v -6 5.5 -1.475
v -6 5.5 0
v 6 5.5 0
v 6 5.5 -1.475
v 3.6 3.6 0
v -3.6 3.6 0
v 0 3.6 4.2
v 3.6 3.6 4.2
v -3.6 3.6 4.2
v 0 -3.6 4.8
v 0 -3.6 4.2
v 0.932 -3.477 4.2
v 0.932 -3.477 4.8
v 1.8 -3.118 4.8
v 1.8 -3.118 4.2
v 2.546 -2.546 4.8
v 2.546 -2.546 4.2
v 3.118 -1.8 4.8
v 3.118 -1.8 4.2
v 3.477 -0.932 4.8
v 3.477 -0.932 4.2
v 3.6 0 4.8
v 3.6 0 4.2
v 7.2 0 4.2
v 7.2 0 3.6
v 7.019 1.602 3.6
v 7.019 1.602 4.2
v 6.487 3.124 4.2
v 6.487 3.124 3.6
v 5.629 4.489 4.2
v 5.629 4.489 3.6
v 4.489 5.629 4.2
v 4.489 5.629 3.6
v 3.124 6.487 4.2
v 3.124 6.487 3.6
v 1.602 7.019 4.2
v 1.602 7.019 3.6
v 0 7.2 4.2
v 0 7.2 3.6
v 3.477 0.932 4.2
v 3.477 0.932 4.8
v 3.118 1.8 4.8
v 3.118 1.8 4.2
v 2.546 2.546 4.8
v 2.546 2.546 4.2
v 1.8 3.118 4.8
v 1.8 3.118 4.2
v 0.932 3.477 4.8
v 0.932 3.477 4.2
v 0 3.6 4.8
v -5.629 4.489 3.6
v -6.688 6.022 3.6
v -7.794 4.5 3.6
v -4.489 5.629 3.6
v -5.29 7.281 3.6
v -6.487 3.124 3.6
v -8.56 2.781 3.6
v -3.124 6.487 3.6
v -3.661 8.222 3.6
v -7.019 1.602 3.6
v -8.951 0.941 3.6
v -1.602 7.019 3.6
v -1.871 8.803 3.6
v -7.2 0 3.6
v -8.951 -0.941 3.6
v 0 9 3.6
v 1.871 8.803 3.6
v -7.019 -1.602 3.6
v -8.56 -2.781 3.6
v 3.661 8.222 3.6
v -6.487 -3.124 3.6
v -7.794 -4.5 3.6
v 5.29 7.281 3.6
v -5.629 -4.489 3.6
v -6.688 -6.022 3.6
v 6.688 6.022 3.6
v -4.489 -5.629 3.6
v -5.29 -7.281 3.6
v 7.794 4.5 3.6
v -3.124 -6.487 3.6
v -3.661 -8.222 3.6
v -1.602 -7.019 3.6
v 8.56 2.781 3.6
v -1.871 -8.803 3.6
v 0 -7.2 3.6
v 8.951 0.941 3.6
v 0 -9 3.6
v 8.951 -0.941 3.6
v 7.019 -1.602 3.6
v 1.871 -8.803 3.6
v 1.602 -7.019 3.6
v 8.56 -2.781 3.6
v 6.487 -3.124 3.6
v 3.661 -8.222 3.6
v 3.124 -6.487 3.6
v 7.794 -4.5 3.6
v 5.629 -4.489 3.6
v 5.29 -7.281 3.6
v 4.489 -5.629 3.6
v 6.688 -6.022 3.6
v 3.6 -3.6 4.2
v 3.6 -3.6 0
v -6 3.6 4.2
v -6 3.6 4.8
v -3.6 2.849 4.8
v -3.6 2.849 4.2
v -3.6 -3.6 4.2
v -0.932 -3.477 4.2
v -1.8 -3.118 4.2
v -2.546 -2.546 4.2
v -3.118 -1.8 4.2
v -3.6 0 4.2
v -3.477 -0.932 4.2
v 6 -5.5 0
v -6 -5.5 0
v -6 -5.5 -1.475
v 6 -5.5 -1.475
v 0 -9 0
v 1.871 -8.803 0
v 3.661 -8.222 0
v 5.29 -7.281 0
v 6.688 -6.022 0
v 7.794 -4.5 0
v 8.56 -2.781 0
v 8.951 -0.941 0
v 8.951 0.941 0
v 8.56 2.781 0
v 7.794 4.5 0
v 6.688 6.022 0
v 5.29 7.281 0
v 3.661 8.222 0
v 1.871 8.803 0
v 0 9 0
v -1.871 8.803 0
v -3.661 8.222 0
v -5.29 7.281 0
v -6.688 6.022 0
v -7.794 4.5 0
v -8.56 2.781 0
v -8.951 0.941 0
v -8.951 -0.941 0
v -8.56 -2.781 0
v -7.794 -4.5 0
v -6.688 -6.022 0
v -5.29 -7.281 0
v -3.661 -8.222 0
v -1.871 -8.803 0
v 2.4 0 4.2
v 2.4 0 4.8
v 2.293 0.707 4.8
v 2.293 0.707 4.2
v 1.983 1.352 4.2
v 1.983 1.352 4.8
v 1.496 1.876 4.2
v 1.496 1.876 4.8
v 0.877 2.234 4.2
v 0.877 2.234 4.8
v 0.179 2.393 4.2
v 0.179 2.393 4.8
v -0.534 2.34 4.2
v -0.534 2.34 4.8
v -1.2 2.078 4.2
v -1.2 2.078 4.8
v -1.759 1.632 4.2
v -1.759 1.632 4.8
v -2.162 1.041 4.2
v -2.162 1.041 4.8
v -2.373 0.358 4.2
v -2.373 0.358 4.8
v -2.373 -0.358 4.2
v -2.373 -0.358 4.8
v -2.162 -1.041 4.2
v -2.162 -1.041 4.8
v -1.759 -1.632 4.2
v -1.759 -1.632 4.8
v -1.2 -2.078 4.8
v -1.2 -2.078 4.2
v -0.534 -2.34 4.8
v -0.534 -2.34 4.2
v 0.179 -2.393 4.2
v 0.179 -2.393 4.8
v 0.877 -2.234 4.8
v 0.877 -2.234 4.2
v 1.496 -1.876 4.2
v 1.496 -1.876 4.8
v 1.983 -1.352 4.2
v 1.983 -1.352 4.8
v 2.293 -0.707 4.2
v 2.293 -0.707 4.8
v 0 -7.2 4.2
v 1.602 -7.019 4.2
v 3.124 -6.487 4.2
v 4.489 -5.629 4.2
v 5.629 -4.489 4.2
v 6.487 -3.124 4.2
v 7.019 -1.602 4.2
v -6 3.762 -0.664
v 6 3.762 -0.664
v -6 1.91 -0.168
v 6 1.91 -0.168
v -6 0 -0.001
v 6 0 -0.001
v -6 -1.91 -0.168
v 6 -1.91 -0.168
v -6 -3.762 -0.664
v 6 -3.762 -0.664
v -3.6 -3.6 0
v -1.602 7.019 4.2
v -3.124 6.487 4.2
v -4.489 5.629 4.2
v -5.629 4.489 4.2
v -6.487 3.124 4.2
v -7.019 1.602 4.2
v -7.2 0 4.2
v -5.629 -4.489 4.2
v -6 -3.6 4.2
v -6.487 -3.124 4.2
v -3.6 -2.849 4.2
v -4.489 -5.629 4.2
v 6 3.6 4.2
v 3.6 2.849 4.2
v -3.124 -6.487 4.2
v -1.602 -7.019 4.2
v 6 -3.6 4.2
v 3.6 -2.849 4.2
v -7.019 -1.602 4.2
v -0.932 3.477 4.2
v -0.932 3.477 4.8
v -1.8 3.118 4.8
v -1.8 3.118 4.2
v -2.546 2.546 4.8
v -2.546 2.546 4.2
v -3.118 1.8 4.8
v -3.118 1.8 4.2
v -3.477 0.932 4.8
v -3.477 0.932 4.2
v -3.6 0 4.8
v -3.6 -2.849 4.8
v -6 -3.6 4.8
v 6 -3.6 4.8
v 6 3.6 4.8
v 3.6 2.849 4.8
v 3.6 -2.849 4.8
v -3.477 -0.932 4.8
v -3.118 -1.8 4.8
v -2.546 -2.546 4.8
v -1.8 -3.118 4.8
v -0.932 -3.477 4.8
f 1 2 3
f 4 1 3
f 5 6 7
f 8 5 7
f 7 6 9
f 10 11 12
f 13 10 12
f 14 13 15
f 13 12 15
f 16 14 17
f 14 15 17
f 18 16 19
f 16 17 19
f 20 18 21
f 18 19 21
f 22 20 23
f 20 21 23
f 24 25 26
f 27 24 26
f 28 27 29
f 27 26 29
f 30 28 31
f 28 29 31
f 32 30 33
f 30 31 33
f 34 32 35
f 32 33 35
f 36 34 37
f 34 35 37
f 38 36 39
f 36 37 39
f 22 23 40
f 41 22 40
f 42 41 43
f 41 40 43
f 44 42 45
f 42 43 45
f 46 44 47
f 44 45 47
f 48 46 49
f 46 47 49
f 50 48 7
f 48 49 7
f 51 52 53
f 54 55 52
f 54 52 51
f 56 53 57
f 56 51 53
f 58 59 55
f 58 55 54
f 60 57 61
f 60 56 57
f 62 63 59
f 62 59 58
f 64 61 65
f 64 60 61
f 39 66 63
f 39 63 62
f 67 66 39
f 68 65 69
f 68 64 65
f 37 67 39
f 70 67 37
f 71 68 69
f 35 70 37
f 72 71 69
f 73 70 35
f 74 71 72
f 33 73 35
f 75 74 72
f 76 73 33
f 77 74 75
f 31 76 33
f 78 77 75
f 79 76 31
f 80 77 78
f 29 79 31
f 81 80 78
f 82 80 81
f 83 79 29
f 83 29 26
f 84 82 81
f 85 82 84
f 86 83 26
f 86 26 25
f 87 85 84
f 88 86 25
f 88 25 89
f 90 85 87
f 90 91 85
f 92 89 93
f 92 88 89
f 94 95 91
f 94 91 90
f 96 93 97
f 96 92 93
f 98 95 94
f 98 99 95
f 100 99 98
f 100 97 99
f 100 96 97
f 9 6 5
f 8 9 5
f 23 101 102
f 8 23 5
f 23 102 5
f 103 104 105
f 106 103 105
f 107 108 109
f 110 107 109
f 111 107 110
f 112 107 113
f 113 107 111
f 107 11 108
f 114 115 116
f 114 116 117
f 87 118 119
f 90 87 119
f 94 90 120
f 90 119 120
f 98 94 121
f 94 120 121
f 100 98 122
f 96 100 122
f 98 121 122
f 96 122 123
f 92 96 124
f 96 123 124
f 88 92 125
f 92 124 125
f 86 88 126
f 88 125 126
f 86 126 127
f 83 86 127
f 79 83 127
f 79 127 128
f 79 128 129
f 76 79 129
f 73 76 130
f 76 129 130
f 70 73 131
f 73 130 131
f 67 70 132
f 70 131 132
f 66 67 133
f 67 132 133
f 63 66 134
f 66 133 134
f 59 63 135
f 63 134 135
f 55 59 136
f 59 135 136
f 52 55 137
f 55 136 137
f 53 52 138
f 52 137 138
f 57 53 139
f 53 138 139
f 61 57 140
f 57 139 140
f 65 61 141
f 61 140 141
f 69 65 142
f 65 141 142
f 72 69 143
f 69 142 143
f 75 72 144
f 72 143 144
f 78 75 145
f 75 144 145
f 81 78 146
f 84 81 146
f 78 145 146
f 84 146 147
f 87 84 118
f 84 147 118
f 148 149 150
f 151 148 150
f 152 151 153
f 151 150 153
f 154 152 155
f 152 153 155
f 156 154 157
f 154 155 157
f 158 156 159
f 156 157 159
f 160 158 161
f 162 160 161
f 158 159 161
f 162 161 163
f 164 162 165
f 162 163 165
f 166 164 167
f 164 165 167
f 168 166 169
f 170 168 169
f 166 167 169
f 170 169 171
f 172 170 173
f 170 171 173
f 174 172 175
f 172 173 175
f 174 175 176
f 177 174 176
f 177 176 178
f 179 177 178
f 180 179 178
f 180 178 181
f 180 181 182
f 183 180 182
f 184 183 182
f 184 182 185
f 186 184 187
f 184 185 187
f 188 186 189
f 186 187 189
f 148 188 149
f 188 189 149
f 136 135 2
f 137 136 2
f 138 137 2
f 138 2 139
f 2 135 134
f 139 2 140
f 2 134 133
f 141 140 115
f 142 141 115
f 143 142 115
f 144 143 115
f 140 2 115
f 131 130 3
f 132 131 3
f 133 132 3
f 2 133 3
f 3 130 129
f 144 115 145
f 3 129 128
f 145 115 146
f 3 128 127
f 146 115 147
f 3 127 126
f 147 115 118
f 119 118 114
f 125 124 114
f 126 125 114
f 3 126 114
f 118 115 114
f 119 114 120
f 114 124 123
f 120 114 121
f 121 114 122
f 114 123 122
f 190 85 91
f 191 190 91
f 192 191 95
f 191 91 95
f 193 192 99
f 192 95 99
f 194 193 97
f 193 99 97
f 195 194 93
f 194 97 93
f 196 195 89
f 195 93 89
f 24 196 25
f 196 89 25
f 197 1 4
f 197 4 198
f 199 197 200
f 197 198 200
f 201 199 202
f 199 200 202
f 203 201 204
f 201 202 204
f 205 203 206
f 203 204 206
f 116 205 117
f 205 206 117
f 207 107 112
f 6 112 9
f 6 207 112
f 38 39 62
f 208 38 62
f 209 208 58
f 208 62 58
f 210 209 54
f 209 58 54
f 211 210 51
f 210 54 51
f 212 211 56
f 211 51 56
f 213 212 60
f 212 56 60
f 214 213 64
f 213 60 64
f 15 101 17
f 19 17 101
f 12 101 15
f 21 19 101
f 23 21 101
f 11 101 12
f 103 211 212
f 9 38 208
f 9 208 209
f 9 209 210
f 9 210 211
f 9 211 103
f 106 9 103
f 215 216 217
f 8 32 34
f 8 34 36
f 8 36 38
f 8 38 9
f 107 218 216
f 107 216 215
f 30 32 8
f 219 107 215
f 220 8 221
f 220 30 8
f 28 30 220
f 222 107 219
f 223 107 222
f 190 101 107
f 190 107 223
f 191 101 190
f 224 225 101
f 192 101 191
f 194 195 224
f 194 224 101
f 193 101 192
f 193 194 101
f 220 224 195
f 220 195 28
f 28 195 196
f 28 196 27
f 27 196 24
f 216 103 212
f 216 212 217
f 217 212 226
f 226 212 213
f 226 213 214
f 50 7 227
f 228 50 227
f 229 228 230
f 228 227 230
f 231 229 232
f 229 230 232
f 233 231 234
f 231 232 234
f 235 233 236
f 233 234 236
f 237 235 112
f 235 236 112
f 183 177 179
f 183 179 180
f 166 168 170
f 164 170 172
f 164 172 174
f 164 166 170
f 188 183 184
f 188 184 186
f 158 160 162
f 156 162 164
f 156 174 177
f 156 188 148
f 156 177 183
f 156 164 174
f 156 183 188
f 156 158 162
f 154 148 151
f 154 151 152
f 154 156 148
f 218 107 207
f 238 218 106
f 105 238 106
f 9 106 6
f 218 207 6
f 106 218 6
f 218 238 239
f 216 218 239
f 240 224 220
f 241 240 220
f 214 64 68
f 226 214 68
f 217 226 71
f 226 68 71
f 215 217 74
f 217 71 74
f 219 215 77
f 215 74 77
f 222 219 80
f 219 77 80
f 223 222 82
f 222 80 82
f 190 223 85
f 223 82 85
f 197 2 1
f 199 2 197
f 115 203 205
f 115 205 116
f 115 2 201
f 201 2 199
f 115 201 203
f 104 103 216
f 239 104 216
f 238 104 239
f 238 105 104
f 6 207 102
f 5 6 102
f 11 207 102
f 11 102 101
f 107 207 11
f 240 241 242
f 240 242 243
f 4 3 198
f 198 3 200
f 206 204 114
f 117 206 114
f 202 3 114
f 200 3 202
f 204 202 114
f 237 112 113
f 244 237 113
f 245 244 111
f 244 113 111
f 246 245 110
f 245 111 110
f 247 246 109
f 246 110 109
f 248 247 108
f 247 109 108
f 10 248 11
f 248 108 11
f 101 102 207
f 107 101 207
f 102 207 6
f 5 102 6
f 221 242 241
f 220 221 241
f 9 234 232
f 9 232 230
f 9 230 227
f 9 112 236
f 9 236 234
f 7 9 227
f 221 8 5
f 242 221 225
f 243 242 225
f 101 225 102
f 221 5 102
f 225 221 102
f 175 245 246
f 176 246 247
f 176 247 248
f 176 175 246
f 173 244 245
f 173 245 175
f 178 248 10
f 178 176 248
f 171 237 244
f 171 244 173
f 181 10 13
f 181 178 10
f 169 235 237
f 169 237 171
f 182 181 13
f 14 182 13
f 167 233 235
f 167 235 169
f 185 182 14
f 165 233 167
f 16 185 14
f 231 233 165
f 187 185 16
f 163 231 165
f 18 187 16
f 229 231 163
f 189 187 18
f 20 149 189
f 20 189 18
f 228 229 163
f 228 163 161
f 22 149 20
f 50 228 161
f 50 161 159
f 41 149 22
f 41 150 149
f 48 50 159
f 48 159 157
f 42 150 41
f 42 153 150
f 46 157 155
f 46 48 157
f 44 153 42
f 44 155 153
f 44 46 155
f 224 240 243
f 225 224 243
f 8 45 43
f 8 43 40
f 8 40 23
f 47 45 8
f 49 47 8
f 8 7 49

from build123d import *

# Parameters (mm, degrees)
F1_DEPTH  = 3
F2_DEPTH  = 3.5
F3_DEPTH  = 4
F0_W      = 3
F0_H      = 2
F7_DEPTH  = 6
F8_R      = 2
F9_DEPTH  = 0.5
F11_DEPTH = 3.5
F13_SCALE = 1.2
F14_ANGLE = 90
F15_W     = 12
F15_H     = 11
F16_DEPTH = 11
F17_R     = 11
F18_DEPTH = 12
F20_DEPTH = 0.6


# Not quite as in the source:
# - a feature of the source that left no trace in its solid (it failed there, or was rolled back) is left out


with BuildPart() as f1:
    # F0 (on Top) → F1 (new body)
    with BuildSketch(Plane.XY):
        with BuildLine():
            ThreePointArc((0, -7.5), (5.3033008589, -5.3033008589), (7.5, 0))
            Line((7.5, 0), (6, 0))
            ThreePointArc((6, 0), (4.2426406871, -4.2426406871), (0, -6))
            Line((0, -6), (0, -7.5))
        make_face()
        with BuildLine():
            ThreePointArc((-7.5, 0), (-5.3033008589, -5.3033008589), (0, -7.5))
            Line((0, -7.5), (0, -6))
            ThreePointArc((0, -6), (-4.2426406871, -4.2426406871), (-6, 0))
            Line((-6, 0), (-7.5, 0))
        make_face()
        with BuildLine():
            Line((0, 6), (0, 7.5))
            ThreePointArc((0, 7.5), (-5.3033008589, 5.3033008589), (-7.5, 0))
            Line((-7.5, 0), (-6, 0))
            ThreePointArc((-6, 0), (-4.2426406871, 4.2426406871), (0, 6))
        make_face()
        with BuildLine():
            Line((6, 0), (7.5, 0))
            ThreePointArc((7.5, 0), (5.3033008589, 5.3033008589), (0, 7.5))
            Line((0, 7.5), (0, 6))
            ThreePointArc((0, 6), (4.2426406871, 4.2426406871), (6, 0))
        make_face()
    extrude(amount=F1_DEPTH)

    # F0 (on Top) → F2 (join)
    with BuildSketch(Plane.XY):
        with BuildLine():
            ThreePointArc((0, -6), (4.2426406871, -4.2426406871), (6, 0))
            Line((6, 0), (3, 0))
            Line((3, 0), (3, -3))
            Line((3, -3), (3, -5))
            Line((3, -5), (0, -5))
            Line((0, -5), (0, -6))
        make_face()
        with BuildLine():
            Line((3, 0), (6, 0))
            ThreePointArc((6, 0), (4.2426406871, 4.2426406871), (0, 6))
            Line((0, 6), (0, 5))
            Line((0, 5), (3, 5))
            Line((3, 5), (3, 3))
            Line((3, 3), (3, 0))
        make_face()
        with BuildLine():
            Line((0, 5), (0, 6))
            ThreePointArc((0, 6), (-4.2426406871, 4.2426406871), (-6, 0))
            Line((-6, 0), (-3, 0))
            Line((-3, 0), (-3, 3))
            Line((-3, 3), (-3, 5))
            Line((-3, 5), (0, 5))
        make_face()
        with BuildLine():
            ThreePointArc((-6, 0), (-4.2426406871, -4.2426406871), (0, -6))
            Line((0, -6), (0, -5))
            Line((0, -5), (-3, -5))
            Line((-3, -5), (-3, -3))
            Line((-3, -3), (-3, 0))
            Line((-3, 0), (-6, 0))
        make_face()
    extrude(amount=F2_DEPTH)

    # F0 (on Top) → F3, piece 2 (join)
    with BuildSketch(Plane.XY):
        with Locations((1.5, -4)):
            Rectangle(F0_W, F0_H)
        with Locations((-1.5, -4)):
            Rectangle(F0_W, F0_H)
        with Locations((1.5, 4)):
            Rectangle(F0_W, F0_H)
        with Locations((-1.5, 4)):
            Rectangle(F0_W, F0_H)
    extrude(amount=F3_DEPTH)


with BuildPart() as f3:
    # F0 (on Top) → F3 (new body)
    with BuildSketch(Plane.XY):
        with BuildLine():
            ThreePointArc((0, -3), (2.1213203436, -2.1213203436), (3, 0))
            Line((3, 0), (0, 0))
            Line((0, 0), (0, -3))
        make_face()
        with BuildLine():
            ThreePointArc((-3, 0), (-2.1213203436, -2.1213203436), (0, -3))
            Line((0, -3), (0, 0))
            Line((0, 0), (-3, 0))
        make_face()
        with BuildLine():
            Line((0, 0), (0, 3))
            ThreePointArc((0, 3), (-2.1213203436, 2.1213203436), (-3, 0))
            Line((-3, 0), (0, 0))
        make_face()
        with BuildLine():
            Line((0, 0), (3, 0))
            ThreePointArc((3, 0), (2.1213203436, 2.1213203436), (0, 3))
            Line((0, 3), (0, 0))
        make_face()
    extrude(amount=F3_DEPTH)

    # F7 (add): a face of the model
    f7_faces = [f1.part.faces().sort_by_distance(p)[0] for p in [
        (-3, 0, 1.75),
    ]]
    extrude(f7_faces, amount=F7_DEPTH)

    # F8 (on face) → F9 (cut)
    with BuildSketch(Plane.XY.offset(4)):
        Circle(F8_R)
    extrude(amount=-F9_DEPTH, mode=Mode.SUBTRACT)


with BuildPart() as f11:
    # F10 (on Top) → F11 (new body)
    with BuildSketch(Plane.XY):
        with BuildLine():
            ThreePointArc((-24.2659887299, 12.9090552479), (-26.3873090735, 13.7877349043), (-27.2659887299, 15.9090552479))
            Line((-27.2659887299, 15.9090552479), (-27.2659887299, 12.9090552479))
            Line((-27.2659887299, 12.9090552479), (-24.2659887299, 12.9090552479))
        make_face()
    extrude(amount=-F11_DEPTH)


with BuildPart() as f11b:
    # F10 (on Top) → F11, piece 2 (new body)
    with BuildSketch(Plane.XY):
        with BuildLine():
            Line((-21.2659887299, 12.9090552479), (-21.2659887299, 15.9090552479))
            ThreePointArc((-21.2659887299, 15.9090552479), (-22.1446683863, 13.7877349043), (-24.2659887299, 12.9090552479))
            Line((-24.2659887299, 12.9090552479), (-21.2659887299, 12.9090552479))
        make_face()
    extrude(amount=-F11_DEPTH)


with BuildPart() as f11c:
    # F10 (on Top) → F11, piece 3 (new body)
    with BuildSketch(Plane.XY):
        with BuildLine():
            Line((-21.2659887299, 18.9090552479), (-24.2659887299, 18.9090552479))
            ThreePointArc((-24.2659887299, 18.9090552479), (-22.1446683863, 18.0303755915), (-21.2659887299, 15.9090552479))
            Line((-21.2659887299, 15.9090552479), (-21.2659887299, 18.9090552479))
        make_face()
    extrude(amount=-F11_DEPTH)


with BuildPart() as f11d:
    # F10 (on Top) → F11, piece 4 (new body)
    with BuildSketch(Plane.XY):
        with BuildLine():
            Line((-24.2659887299, 18.9090552479), (-27.2659887299, 18.9090552479))
            Line((-27.2659887299, 18.9090552479), (-27.2659887299, 15.9090552479))
            ThreePointArc((-27.2659887299, 15.9090552479), (-26.3873090735, 18.0303755915), (-24.2659887299, 18.9090552479))
        make_face()
    extrude(amount=-F11_DEPTH)


with BuildPart() as f1_1:
    # F13: moved
    add(f1.part.scale(F13_SCALE))


with BuildPart() as f3_1:
    # F13: moved
    add(f3.part.scale(F13_SCALE))


with BuildPart() as f1_2:
    # F14: moved
    add(f1_1.part.rotate(Axis((0, 0, 3.6), (0, 0, -1)), F14_ANGLE))

    # F15 (on face) → F16 (join)
    with BuildSketch(Plane(origin=(0, 0, 0), x_dir=(1, 0, 0), z_dir=(0, 0, -1))):
        Rectangle(F15_W, F15_H)
    extrude(amount=F16_DEPTH)

    # F17 (on face) → F18 (cut, through all)
    with BuildSketch(Plane.YZ.offset(6)):
        with Locations((0, -11.001)):
            Circle(F17_R)
    extrude(amount=-F18_DEPTH, mode=Mode.SUBTRACT)

    # F19 (on face) → F20 (cut, through all)
    with BuildSketch(Plane.XY.offset(4.8)):
        Polygon((3.6, 2.8490975965), (6, 3.6), (3.6, 3.6), align=None)
        Polygon((3.6, -3.6), (6, -3.6), (3.6, -2.8490975965), align=None)
        Polygon((-3.6, -2.8490975965), (-6, -3.6), (-3.6, -3.6), align=None)
        Polygon((-3.6, 3.6), (-6, 3.6), (-3.6, 2.8490975965), align=None)
    extrude(amount=-F20_DEPTH, mode=Mode.SUBTRACT)


solid = Compound([f3_1.part, f1_2.part])
